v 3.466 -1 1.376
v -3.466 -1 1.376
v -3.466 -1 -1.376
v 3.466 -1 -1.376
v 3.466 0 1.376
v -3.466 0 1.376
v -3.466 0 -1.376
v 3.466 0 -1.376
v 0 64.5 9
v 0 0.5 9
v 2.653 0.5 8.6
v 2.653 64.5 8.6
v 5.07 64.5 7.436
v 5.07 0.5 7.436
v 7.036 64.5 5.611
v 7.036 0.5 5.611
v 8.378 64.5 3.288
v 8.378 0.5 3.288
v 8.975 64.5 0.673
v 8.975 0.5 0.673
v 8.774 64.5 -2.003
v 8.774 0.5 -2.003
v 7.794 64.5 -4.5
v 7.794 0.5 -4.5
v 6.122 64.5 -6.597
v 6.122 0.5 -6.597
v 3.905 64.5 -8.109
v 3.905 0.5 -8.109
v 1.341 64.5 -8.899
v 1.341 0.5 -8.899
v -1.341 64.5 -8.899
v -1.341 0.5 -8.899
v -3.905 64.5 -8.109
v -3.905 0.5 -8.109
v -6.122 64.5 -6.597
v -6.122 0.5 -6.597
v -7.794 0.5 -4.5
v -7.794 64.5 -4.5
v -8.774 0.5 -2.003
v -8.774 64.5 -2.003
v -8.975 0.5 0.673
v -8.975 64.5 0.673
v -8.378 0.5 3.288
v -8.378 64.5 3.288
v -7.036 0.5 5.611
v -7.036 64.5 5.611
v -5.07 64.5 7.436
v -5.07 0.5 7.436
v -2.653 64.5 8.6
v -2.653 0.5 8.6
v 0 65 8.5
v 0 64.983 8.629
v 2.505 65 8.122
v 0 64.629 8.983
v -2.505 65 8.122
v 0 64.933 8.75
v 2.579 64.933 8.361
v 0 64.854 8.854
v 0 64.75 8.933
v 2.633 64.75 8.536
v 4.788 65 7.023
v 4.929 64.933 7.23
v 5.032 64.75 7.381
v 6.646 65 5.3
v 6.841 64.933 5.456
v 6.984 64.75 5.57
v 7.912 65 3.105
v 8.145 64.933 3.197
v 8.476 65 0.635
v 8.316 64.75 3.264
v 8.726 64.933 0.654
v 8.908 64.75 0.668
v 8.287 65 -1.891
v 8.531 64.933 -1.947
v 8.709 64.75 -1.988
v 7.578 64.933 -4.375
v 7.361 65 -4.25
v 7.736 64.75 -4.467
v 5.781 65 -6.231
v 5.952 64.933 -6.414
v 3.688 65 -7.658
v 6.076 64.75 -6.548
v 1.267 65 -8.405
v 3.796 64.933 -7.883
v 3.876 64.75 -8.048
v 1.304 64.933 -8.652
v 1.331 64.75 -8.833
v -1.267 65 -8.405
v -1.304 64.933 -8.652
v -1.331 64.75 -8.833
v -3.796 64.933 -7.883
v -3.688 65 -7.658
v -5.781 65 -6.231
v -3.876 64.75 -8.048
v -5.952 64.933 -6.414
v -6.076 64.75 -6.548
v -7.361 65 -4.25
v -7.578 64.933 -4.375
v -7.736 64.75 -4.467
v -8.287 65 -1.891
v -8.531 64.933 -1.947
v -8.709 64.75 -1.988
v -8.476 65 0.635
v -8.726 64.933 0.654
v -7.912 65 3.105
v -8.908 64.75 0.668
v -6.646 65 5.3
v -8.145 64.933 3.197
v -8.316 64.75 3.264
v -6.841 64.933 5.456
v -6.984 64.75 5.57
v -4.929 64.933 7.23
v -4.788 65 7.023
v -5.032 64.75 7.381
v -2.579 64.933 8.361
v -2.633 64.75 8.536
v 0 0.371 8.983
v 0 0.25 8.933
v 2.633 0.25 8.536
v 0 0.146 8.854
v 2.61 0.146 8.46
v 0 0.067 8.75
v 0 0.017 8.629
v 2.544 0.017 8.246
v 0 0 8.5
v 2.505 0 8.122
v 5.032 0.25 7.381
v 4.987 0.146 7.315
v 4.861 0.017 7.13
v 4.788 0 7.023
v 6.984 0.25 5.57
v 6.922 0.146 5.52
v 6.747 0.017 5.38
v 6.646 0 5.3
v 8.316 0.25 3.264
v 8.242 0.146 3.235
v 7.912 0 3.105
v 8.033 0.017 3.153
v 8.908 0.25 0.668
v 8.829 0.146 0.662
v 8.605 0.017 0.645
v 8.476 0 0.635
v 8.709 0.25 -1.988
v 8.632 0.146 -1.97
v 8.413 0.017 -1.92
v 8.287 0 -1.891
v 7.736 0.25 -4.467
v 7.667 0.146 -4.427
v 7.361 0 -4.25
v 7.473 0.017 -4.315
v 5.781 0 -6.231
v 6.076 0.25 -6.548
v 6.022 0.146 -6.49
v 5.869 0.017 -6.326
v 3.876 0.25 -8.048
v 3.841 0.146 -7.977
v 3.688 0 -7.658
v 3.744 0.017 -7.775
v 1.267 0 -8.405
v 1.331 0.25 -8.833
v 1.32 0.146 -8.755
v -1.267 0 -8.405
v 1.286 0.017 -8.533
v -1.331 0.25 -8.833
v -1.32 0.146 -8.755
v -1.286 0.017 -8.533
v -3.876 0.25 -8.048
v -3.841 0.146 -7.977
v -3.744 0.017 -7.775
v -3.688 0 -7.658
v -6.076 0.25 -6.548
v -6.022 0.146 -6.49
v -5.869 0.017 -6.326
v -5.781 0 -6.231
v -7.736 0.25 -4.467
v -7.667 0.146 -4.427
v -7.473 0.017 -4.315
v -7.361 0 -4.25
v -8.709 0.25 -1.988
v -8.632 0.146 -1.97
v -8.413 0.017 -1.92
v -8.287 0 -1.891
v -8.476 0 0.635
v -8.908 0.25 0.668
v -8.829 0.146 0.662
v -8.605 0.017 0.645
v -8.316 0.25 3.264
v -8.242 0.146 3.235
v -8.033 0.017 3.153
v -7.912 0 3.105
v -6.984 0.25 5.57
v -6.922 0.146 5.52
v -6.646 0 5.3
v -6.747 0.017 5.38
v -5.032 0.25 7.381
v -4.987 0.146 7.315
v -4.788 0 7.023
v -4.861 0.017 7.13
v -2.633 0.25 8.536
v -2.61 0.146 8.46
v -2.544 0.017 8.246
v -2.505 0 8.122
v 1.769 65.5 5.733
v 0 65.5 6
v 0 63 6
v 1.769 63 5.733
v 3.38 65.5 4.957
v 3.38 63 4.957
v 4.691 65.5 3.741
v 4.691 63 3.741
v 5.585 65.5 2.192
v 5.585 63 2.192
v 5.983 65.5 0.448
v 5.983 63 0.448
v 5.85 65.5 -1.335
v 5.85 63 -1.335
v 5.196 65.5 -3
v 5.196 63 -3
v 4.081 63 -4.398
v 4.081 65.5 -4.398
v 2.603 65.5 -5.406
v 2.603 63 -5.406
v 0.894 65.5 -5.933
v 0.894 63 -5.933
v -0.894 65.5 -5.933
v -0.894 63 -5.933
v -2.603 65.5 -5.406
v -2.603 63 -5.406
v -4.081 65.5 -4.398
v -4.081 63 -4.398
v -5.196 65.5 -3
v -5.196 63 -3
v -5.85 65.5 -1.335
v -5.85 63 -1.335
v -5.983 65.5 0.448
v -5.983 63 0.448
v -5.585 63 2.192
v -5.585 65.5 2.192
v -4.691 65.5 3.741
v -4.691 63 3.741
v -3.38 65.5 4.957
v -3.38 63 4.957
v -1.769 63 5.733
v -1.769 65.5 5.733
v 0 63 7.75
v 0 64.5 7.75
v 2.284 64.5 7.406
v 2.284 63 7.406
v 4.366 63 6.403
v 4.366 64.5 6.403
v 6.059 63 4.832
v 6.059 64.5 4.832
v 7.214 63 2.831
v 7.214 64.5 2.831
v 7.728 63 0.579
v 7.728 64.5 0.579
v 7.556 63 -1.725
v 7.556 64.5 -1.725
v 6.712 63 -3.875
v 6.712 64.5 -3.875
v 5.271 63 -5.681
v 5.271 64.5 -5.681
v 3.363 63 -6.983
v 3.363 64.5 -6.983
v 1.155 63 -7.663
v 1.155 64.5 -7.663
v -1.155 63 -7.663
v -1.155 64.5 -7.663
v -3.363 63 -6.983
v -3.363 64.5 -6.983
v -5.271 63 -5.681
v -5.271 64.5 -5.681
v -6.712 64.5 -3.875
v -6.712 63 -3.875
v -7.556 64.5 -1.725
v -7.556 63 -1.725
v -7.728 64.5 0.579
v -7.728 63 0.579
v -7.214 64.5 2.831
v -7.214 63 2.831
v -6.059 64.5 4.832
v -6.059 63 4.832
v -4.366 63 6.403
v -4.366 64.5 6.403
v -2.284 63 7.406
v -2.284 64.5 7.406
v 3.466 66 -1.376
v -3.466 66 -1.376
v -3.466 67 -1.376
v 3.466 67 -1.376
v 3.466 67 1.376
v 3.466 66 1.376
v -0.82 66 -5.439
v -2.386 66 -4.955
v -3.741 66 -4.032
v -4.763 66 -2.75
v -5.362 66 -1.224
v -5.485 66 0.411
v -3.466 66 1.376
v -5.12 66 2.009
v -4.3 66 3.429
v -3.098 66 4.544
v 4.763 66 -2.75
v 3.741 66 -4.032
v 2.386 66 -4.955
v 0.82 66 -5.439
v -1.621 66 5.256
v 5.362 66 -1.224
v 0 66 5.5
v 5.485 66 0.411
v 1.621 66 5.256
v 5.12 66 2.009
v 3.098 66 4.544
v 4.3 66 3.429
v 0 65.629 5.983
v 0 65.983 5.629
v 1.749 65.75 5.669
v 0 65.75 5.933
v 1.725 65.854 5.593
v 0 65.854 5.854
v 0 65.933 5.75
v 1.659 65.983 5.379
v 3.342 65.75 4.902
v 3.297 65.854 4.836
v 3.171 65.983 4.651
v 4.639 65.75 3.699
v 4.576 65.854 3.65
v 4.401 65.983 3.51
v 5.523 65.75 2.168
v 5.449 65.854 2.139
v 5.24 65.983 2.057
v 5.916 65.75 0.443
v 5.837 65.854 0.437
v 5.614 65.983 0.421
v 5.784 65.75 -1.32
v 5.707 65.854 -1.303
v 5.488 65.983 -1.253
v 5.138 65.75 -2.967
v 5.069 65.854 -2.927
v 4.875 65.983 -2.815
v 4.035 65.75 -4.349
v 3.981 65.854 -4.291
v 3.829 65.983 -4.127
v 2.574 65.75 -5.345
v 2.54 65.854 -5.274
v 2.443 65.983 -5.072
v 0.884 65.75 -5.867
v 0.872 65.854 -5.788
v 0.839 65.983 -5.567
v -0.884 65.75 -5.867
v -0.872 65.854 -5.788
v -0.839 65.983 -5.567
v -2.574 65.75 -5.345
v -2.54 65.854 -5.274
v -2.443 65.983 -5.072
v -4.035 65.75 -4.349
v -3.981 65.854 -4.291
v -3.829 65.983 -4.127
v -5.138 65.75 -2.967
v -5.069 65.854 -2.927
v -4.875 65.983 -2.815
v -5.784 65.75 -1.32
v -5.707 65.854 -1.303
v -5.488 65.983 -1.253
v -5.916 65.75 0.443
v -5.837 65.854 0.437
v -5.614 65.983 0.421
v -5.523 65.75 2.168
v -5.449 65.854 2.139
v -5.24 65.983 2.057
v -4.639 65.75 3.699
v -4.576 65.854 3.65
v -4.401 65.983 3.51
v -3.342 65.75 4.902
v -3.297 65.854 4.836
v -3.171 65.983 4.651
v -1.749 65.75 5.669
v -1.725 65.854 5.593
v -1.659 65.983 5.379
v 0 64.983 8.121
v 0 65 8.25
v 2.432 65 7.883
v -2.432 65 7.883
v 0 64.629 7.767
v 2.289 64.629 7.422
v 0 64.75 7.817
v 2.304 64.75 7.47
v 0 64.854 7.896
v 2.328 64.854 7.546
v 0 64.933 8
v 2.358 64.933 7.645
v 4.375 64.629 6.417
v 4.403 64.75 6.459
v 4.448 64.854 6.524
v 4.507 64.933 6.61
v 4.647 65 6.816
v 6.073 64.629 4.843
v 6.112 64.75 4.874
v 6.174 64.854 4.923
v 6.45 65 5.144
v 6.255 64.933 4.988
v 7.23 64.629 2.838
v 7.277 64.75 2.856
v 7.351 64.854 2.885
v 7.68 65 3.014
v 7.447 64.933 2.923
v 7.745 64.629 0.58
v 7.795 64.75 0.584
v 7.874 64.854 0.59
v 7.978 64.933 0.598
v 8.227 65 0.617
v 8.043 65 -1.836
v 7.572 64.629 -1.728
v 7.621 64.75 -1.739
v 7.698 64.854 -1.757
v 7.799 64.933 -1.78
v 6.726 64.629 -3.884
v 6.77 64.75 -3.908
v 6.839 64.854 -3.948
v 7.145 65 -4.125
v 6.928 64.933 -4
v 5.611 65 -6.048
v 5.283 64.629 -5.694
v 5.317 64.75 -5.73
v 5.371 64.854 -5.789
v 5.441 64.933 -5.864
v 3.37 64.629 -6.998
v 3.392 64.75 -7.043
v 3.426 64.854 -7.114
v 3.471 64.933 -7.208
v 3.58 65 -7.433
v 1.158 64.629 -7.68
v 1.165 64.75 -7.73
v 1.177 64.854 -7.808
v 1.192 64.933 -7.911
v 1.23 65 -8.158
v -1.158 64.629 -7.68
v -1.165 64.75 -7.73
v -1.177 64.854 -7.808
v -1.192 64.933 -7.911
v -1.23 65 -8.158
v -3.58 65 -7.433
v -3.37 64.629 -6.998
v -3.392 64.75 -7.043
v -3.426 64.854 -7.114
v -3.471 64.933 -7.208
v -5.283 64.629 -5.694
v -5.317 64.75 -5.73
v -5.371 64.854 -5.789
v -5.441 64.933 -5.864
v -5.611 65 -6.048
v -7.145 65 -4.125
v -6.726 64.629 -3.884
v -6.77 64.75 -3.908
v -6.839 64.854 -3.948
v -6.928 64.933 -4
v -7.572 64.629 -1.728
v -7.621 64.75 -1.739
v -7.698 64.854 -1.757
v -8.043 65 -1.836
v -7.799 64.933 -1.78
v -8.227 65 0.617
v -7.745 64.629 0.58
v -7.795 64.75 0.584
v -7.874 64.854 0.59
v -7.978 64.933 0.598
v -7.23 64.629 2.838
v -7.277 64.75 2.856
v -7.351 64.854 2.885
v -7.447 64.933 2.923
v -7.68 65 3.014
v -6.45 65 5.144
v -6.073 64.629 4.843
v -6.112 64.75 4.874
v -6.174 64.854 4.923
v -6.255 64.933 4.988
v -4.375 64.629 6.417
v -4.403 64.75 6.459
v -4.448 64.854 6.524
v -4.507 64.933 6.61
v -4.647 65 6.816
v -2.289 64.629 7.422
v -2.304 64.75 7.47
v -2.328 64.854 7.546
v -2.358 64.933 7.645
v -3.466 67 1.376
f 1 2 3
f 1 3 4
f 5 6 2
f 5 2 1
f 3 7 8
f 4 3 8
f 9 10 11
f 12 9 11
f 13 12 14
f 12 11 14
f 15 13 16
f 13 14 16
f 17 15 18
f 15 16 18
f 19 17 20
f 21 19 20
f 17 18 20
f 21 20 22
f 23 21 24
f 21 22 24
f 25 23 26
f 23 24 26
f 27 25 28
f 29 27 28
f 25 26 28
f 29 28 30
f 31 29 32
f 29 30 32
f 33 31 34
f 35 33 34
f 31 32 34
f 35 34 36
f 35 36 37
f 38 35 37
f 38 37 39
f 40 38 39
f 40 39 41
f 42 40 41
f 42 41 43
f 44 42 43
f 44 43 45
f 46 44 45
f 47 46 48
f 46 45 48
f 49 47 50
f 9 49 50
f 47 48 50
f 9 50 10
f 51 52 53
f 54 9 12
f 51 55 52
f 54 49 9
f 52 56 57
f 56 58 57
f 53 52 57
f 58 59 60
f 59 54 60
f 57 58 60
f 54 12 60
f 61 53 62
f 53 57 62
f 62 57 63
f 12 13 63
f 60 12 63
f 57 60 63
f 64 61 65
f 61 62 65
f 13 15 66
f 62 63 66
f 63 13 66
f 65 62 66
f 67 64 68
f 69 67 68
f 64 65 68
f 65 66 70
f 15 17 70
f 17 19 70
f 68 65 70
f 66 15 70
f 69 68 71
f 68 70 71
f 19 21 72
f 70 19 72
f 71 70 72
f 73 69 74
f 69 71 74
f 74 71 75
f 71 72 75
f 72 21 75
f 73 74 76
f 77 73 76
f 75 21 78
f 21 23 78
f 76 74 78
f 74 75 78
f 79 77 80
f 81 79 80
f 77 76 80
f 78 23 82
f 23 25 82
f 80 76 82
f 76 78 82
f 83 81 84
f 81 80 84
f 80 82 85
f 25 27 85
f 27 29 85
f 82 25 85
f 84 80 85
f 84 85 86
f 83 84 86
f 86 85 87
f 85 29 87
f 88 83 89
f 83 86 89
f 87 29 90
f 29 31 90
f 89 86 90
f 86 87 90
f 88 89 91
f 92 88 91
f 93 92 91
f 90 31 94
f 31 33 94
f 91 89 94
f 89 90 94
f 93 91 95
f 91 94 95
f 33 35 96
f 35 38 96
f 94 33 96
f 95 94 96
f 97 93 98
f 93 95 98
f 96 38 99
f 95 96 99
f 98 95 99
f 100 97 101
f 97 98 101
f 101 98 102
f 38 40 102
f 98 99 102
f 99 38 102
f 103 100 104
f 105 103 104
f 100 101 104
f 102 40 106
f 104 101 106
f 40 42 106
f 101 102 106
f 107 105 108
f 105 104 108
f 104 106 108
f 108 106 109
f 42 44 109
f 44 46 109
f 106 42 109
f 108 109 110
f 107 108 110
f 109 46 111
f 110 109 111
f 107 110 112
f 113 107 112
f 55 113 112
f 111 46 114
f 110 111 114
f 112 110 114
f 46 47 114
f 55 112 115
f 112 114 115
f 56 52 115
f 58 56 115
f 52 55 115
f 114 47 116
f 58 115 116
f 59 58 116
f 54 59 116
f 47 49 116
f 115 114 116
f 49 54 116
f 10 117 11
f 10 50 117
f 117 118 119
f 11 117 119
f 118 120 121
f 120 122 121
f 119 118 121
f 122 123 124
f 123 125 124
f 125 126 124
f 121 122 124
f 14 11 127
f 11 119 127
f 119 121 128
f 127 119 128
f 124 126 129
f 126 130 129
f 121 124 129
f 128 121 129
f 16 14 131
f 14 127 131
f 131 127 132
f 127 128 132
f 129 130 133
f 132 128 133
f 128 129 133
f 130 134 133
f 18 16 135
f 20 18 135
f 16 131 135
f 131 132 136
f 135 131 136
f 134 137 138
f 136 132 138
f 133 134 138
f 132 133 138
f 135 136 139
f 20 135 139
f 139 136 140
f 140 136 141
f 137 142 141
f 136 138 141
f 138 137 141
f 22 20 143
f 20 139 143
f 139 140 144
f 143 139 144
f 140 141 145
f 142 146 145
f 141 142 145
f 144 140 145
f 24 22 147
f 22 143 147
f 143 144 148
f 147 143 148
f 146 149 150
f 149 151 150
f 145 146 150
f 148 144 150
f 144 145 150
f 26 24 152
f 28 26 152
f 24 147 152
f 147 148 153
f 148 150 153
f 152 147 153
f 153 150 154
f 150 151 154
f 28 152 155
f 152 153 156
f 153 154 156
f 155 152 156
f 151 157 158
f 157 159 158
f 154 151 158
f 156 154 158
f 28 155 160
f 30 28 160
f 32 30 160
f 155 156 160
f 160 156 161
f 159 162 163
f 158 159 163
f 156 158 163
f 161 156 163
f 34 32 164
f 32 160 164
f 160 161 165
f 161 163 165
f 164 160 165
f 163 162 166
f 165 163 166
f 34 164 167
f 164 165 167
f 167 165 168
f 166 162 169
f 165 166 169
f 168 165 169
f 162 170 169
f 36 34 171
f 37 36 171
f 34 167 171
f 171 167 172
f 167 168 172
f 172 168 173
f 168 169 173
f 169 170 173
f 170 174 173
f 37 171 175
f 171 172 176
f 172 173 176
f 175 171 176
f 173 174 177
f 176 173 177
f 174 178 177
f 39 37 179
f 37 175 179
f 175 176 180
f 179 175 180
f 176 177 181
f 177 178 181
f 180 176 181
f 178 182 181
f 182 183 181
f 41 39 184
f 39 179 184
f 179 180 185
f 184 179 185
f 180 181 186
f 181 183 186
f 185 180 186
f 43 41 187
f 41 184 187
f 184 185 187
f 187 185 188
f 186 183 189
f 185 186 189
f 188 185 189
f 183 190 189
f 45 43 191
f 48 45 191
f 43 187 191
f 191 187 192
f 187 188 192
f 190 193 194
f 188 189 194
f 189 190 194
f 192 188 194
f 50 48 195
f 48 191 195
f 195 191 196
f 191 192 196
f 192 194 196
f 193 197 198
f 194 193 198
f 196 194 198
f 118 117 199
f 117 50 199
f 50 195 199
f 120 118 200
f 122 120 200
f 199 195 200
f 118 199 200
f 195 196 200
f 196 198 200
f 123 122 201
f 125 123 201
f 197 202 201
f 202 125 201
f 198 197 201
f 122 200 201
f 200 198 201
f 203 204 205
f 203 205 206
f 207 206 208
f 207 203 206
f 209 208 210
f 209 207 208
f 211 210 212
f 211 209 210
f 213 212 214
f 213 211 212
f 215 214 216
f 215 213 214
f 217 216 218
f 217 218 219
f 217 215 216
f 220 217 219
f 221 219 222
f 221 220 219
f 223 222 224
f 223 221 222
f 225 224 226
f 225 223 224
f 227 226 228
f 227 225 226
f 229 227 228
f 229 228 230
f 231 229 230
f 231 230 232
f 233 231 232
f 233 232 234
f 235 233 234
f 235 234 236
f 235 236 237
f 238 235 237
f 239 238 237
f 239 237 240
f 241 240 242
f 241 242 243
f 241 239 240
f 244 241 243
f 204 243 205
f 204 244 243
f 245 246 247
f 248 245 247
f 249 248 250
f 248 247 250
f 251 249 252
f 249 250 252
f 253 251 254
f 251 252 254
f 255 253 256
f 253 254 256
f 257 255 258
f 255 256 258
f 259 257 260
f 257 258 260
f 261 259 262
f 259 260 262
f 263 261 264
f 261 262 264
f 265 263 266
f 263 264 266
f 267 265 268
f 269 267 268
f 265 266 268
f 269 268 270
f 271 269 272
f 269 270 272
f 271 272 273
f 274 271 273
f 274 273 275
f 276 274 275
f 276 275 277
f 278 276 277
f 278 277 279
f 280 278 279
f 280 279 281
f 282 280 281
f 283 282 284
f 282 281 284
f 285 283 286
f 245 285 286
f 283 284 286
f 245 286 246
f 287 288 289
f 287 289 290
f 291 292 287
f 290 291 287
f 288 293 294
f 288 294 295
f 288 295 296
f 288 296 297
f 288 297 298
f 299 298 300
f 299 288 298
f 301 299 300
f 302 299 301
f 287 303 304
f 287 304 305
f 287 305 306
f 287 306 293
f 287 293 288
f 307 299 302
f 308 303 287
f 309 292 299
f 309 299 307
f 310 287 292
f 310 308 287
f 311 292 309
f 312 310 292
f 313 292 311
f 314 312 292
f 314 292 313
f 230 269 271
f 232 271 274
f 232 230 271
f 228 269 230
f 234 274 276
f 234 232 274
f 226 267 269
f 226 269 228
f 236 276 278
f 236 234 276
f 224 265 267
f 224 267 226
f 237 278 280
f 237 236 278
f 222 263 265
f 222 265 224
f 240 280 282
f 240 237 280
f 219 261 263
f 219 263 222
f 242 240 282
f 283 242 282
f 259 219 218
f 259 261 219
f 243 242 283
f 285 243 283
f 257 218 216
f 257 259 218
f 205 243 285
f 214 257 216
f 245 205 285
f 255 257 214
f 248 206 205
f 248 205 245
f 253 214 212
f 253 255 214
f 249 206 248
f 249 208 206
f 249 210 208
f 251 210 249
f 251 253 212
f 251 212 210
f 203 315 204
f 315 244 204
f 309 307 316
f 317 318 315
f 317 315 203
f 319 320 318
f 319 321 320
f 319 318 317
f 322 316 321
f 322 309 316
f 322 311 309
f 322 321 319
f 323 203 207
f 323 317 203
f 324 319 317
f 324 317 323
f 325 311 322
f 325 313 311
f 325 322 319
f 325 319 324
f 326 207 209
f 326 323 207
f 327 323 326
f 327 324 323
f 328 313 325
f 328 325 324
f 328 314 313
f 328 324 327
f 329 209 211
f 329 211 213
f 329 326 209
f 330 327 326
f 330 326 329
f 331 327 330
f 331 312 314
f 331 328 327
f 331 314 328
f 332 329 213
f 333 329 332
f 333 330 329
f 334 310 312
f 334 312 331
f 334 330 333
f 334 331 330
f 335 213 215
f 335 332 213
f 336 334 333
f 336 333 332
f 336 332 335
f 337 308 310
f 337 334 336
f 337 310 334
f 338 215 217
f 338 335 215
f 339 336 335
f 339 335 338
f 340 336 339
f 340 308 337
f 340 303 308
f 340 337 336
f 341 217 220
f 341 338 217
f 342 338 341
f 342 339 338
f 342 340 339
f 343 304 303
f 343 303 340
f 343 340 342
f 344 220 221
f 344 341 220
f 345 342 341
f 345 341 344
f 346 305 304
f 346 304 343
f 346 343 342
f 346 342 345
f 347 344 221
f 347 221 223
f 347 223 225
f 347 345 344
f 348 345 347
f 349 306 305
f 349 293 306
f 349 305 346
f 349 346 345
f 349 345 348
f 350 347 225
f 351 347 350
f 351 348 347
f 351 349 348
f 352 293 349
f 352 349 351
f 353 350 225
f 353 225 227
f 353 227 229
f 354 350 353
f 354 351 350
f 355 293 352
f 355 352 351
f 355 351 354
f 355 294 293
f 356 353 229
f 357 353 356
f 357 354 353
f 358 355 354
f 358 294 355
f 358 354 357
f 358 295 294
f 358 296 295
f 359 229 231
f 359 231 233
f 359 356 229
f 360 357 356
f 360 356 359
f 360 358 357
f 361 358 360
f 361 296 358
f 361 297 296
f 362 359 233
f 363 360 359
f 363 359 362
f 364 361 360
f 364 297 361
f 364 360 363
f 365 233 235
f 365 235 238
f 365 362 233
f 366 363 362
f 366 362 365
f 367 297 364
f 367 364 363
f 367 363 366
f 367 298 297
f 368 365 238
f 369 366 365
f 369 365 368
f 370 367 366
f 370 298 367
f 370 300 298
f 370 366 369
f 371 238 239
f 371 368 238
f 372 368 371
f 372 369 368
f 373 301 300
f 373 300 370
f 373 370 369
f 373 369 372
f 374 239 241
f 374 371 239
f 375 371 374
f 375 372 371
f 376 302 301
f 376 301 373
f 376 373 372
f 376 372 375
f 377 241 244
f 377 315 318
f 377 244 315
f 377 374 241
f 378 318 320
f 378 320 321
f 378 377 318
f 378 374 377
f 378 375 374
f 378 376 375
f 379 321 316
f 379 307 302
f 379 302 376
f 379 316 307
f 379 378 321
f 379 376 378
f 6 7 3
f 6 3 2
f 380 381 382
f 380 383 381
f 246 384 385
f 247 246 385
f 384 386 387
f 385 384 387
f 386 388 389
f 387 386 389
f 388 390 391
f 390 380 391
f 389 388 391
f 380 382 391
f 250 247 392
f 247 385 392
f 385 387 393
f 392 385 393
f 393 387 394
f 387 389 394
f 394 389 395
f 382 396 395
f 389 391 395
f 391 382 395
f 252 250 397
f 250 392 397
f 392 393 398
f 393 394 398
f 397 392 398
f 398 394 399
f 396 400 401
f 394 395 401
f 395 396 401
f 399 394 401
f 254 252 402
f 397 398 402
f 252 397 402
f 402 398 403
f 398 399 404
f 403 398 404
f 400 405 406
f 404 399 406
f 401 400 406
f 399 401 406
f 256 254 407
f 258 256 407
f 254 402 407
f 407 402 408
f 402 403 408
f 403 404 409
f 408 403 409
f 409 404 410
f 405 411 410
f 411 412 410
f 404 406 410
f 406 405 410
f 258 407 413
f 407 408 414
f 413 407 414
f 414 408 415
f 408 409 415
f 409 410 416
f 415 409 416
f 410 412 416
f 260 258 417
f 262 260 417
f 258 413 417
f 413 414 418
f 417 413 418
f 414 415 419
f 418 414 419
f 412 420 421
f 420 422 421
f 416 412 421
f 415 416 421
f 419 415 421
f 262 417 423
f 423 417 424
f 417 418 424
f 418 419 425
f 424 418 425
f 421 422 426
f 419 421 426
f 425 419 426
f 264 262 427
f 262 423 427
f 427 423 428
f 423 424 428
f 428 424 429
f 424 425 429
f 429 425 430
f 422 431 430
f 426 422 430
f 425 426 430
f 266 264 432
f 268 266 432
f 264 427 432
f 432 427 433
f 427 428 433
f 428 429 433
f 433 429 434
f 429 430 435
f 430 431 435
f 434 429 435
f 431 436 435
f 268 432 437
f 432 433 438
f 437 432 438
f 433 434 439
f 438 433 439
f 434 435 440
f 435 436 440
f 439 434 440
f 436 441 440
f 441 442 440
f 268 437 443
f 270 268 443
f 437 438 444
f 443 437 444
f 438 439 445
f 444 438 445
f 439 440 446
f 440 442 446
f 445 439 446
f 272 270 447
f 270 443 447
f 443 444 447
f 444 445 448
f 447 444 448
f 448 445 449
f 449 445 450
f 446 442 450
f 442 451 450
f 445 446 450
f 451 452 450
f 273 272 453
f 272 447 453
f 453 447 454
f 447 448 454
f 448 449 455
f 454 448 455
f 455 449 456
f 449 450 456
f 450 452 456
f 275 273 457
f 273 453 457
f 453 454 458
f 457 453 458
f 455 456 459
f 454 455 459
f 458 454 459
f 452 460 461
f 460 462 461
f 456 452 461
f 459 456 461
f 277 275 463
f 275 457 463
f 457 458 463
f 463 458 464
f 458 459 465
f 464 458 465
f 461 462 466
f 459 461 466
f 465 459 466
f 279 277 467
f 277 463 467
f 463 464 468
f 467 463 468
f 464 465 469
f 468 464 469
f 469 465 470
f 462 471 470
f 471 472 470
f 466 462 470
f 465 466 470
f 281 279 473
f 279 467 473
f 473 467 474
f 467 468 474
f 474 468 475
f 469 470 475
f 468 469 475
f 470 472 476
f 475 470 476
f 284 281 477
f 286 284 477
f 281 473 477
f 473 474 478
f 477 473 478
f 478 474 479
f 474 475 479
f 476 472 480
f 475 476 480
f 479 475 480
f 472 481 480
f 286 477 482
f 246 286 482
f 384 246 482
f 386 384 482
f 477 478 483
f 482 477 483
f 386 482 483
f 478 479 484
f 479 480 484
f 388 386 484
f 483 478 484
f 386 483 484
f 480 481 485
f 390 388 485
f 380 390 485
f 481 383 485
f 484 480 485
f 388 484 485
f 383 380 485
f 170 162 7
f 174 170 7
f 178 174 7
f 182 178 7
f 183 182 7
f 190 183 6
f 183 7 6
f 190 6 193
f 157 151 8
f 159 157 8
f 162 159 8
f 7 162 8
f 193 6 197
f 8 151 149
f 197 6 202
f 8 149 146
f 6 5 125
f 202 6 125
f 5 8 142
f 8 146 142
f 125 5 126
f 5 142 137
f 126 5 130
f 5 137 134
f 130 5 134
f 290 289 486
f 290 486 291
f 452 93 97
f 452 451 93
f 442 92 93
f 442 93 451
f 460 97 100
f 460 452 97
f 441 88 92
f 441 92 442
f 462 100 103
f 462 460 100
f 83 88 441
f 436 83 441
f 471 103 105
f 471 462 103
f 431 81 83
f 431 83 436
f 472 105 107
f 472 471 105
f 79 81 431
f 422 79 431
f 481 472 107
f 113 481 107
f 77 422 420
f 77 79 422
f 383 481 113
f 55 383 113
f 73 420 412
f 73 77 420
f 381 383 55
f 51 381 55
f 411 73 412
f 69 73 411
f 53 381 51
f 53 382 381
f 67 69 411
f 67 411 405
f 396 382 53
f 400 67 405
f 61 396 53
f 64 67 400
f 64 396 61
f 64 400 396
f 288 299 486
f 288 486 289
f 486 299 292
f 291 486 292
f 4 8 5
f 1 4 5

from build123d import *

# Parameters (mm, degrees)
SKETCH_1_R          = 9
EXTRUDE_1_DEPTH     = 65
SKETCH_2_R          = 7.75
SKETCH_2_R_2        = 6
CUT_EXTRUDE_1_DEPTH = 2
EXTRUDE_START       = 1
SKETCH_4_R          = 6
EXTRUDE_3_DEPTH     = 1
FILLET_1_R          = 0.5
SKETCH_3_W          = 6.932919868
SKETCH_3_H          = 2.75170262
EXTRUDE_910_DEPTH   = 1
SKETCH_5_W          = 6.932919868
SKETCH_5_H          = 2.75170262
EXTRUDE_1061_DEPTH  = 1


with BuildPart() as part:
    # 草图1 → 凸台-拉伸1 (new body)
    with BuildSketch(Plane(origin=(0, 0, 0), x_dir=(1, 0, 0), z_dir=(0, 1, 0))):
        with Locations(Location((0, 0, 0), (0, 0, 270))):
            Circle(SKETCH_1_R)
    extrude(amount=EXTRUDE_1_DEPTH)

    # 草图2 → 切除-拉伸1 (cut)
    with BuildSketch(Plane(origin=(0, 65, 0), x_dir=(1, 0, 0), z_dir=(0, 1, 0))):
        with Locations(Location((0, 0, 0), (0, 0, 270))):
            Circle(SKETCH_2_R)
        with Locations(Location((0, 0, 0), (0, 0, 270))):
            Circle(SKETCH_2_R_2, mode=Mode.SUBTRACT)
    extrude(amount=-CUT_EXTRUDE_1_DEPTH, mode=Mode.SUBTRACT)

    # 草图4 → 凸台-拉伸3 (add)
    with BuildSketch(Plane(origin=(0, 65, 0), x_dir=(1, 0, 0), z_dir=(0, 1, 0)).offset(EXTRUDE_START)):
        with Locations(Location((0, 0, 0), (0, 0, 270))):
            Circle(SKETCH_4_R)
    extrude(amount=-EXTRUDE_3_DEPTH)

    # 圆角1
    fillet_1_edges = [part.edges().sort_by_distance(p)[0] for p in [
        (0, 66, -6),
        (0, 0, -9),
        (0, 65, -9),
        (0, 65, -7.75),
    ]]
    fillet(fillet_1_edges, radius=FILLET_1_R)

    # 草图3 → Extrude 910 (add)
    with BuildSketch(Plane.XZ):
        Rectangle(SKETCH_3_W, SKETCH_3_H)
    extrude(amount=EXTRUDE_910_DEPTH)

    # 草图5 → Extrude 1061 (add)
    with BuildSketch(Plane(origin=(0, 66, 0), x_dir=(1, 0, 0), z_dir=(0, 1, 0))):
        Rectangle(SKETCH_5_W, SKETCH_5_H)
    extrude(amount=EXTRUDE_1061_DEPTH)


solid = part.part
